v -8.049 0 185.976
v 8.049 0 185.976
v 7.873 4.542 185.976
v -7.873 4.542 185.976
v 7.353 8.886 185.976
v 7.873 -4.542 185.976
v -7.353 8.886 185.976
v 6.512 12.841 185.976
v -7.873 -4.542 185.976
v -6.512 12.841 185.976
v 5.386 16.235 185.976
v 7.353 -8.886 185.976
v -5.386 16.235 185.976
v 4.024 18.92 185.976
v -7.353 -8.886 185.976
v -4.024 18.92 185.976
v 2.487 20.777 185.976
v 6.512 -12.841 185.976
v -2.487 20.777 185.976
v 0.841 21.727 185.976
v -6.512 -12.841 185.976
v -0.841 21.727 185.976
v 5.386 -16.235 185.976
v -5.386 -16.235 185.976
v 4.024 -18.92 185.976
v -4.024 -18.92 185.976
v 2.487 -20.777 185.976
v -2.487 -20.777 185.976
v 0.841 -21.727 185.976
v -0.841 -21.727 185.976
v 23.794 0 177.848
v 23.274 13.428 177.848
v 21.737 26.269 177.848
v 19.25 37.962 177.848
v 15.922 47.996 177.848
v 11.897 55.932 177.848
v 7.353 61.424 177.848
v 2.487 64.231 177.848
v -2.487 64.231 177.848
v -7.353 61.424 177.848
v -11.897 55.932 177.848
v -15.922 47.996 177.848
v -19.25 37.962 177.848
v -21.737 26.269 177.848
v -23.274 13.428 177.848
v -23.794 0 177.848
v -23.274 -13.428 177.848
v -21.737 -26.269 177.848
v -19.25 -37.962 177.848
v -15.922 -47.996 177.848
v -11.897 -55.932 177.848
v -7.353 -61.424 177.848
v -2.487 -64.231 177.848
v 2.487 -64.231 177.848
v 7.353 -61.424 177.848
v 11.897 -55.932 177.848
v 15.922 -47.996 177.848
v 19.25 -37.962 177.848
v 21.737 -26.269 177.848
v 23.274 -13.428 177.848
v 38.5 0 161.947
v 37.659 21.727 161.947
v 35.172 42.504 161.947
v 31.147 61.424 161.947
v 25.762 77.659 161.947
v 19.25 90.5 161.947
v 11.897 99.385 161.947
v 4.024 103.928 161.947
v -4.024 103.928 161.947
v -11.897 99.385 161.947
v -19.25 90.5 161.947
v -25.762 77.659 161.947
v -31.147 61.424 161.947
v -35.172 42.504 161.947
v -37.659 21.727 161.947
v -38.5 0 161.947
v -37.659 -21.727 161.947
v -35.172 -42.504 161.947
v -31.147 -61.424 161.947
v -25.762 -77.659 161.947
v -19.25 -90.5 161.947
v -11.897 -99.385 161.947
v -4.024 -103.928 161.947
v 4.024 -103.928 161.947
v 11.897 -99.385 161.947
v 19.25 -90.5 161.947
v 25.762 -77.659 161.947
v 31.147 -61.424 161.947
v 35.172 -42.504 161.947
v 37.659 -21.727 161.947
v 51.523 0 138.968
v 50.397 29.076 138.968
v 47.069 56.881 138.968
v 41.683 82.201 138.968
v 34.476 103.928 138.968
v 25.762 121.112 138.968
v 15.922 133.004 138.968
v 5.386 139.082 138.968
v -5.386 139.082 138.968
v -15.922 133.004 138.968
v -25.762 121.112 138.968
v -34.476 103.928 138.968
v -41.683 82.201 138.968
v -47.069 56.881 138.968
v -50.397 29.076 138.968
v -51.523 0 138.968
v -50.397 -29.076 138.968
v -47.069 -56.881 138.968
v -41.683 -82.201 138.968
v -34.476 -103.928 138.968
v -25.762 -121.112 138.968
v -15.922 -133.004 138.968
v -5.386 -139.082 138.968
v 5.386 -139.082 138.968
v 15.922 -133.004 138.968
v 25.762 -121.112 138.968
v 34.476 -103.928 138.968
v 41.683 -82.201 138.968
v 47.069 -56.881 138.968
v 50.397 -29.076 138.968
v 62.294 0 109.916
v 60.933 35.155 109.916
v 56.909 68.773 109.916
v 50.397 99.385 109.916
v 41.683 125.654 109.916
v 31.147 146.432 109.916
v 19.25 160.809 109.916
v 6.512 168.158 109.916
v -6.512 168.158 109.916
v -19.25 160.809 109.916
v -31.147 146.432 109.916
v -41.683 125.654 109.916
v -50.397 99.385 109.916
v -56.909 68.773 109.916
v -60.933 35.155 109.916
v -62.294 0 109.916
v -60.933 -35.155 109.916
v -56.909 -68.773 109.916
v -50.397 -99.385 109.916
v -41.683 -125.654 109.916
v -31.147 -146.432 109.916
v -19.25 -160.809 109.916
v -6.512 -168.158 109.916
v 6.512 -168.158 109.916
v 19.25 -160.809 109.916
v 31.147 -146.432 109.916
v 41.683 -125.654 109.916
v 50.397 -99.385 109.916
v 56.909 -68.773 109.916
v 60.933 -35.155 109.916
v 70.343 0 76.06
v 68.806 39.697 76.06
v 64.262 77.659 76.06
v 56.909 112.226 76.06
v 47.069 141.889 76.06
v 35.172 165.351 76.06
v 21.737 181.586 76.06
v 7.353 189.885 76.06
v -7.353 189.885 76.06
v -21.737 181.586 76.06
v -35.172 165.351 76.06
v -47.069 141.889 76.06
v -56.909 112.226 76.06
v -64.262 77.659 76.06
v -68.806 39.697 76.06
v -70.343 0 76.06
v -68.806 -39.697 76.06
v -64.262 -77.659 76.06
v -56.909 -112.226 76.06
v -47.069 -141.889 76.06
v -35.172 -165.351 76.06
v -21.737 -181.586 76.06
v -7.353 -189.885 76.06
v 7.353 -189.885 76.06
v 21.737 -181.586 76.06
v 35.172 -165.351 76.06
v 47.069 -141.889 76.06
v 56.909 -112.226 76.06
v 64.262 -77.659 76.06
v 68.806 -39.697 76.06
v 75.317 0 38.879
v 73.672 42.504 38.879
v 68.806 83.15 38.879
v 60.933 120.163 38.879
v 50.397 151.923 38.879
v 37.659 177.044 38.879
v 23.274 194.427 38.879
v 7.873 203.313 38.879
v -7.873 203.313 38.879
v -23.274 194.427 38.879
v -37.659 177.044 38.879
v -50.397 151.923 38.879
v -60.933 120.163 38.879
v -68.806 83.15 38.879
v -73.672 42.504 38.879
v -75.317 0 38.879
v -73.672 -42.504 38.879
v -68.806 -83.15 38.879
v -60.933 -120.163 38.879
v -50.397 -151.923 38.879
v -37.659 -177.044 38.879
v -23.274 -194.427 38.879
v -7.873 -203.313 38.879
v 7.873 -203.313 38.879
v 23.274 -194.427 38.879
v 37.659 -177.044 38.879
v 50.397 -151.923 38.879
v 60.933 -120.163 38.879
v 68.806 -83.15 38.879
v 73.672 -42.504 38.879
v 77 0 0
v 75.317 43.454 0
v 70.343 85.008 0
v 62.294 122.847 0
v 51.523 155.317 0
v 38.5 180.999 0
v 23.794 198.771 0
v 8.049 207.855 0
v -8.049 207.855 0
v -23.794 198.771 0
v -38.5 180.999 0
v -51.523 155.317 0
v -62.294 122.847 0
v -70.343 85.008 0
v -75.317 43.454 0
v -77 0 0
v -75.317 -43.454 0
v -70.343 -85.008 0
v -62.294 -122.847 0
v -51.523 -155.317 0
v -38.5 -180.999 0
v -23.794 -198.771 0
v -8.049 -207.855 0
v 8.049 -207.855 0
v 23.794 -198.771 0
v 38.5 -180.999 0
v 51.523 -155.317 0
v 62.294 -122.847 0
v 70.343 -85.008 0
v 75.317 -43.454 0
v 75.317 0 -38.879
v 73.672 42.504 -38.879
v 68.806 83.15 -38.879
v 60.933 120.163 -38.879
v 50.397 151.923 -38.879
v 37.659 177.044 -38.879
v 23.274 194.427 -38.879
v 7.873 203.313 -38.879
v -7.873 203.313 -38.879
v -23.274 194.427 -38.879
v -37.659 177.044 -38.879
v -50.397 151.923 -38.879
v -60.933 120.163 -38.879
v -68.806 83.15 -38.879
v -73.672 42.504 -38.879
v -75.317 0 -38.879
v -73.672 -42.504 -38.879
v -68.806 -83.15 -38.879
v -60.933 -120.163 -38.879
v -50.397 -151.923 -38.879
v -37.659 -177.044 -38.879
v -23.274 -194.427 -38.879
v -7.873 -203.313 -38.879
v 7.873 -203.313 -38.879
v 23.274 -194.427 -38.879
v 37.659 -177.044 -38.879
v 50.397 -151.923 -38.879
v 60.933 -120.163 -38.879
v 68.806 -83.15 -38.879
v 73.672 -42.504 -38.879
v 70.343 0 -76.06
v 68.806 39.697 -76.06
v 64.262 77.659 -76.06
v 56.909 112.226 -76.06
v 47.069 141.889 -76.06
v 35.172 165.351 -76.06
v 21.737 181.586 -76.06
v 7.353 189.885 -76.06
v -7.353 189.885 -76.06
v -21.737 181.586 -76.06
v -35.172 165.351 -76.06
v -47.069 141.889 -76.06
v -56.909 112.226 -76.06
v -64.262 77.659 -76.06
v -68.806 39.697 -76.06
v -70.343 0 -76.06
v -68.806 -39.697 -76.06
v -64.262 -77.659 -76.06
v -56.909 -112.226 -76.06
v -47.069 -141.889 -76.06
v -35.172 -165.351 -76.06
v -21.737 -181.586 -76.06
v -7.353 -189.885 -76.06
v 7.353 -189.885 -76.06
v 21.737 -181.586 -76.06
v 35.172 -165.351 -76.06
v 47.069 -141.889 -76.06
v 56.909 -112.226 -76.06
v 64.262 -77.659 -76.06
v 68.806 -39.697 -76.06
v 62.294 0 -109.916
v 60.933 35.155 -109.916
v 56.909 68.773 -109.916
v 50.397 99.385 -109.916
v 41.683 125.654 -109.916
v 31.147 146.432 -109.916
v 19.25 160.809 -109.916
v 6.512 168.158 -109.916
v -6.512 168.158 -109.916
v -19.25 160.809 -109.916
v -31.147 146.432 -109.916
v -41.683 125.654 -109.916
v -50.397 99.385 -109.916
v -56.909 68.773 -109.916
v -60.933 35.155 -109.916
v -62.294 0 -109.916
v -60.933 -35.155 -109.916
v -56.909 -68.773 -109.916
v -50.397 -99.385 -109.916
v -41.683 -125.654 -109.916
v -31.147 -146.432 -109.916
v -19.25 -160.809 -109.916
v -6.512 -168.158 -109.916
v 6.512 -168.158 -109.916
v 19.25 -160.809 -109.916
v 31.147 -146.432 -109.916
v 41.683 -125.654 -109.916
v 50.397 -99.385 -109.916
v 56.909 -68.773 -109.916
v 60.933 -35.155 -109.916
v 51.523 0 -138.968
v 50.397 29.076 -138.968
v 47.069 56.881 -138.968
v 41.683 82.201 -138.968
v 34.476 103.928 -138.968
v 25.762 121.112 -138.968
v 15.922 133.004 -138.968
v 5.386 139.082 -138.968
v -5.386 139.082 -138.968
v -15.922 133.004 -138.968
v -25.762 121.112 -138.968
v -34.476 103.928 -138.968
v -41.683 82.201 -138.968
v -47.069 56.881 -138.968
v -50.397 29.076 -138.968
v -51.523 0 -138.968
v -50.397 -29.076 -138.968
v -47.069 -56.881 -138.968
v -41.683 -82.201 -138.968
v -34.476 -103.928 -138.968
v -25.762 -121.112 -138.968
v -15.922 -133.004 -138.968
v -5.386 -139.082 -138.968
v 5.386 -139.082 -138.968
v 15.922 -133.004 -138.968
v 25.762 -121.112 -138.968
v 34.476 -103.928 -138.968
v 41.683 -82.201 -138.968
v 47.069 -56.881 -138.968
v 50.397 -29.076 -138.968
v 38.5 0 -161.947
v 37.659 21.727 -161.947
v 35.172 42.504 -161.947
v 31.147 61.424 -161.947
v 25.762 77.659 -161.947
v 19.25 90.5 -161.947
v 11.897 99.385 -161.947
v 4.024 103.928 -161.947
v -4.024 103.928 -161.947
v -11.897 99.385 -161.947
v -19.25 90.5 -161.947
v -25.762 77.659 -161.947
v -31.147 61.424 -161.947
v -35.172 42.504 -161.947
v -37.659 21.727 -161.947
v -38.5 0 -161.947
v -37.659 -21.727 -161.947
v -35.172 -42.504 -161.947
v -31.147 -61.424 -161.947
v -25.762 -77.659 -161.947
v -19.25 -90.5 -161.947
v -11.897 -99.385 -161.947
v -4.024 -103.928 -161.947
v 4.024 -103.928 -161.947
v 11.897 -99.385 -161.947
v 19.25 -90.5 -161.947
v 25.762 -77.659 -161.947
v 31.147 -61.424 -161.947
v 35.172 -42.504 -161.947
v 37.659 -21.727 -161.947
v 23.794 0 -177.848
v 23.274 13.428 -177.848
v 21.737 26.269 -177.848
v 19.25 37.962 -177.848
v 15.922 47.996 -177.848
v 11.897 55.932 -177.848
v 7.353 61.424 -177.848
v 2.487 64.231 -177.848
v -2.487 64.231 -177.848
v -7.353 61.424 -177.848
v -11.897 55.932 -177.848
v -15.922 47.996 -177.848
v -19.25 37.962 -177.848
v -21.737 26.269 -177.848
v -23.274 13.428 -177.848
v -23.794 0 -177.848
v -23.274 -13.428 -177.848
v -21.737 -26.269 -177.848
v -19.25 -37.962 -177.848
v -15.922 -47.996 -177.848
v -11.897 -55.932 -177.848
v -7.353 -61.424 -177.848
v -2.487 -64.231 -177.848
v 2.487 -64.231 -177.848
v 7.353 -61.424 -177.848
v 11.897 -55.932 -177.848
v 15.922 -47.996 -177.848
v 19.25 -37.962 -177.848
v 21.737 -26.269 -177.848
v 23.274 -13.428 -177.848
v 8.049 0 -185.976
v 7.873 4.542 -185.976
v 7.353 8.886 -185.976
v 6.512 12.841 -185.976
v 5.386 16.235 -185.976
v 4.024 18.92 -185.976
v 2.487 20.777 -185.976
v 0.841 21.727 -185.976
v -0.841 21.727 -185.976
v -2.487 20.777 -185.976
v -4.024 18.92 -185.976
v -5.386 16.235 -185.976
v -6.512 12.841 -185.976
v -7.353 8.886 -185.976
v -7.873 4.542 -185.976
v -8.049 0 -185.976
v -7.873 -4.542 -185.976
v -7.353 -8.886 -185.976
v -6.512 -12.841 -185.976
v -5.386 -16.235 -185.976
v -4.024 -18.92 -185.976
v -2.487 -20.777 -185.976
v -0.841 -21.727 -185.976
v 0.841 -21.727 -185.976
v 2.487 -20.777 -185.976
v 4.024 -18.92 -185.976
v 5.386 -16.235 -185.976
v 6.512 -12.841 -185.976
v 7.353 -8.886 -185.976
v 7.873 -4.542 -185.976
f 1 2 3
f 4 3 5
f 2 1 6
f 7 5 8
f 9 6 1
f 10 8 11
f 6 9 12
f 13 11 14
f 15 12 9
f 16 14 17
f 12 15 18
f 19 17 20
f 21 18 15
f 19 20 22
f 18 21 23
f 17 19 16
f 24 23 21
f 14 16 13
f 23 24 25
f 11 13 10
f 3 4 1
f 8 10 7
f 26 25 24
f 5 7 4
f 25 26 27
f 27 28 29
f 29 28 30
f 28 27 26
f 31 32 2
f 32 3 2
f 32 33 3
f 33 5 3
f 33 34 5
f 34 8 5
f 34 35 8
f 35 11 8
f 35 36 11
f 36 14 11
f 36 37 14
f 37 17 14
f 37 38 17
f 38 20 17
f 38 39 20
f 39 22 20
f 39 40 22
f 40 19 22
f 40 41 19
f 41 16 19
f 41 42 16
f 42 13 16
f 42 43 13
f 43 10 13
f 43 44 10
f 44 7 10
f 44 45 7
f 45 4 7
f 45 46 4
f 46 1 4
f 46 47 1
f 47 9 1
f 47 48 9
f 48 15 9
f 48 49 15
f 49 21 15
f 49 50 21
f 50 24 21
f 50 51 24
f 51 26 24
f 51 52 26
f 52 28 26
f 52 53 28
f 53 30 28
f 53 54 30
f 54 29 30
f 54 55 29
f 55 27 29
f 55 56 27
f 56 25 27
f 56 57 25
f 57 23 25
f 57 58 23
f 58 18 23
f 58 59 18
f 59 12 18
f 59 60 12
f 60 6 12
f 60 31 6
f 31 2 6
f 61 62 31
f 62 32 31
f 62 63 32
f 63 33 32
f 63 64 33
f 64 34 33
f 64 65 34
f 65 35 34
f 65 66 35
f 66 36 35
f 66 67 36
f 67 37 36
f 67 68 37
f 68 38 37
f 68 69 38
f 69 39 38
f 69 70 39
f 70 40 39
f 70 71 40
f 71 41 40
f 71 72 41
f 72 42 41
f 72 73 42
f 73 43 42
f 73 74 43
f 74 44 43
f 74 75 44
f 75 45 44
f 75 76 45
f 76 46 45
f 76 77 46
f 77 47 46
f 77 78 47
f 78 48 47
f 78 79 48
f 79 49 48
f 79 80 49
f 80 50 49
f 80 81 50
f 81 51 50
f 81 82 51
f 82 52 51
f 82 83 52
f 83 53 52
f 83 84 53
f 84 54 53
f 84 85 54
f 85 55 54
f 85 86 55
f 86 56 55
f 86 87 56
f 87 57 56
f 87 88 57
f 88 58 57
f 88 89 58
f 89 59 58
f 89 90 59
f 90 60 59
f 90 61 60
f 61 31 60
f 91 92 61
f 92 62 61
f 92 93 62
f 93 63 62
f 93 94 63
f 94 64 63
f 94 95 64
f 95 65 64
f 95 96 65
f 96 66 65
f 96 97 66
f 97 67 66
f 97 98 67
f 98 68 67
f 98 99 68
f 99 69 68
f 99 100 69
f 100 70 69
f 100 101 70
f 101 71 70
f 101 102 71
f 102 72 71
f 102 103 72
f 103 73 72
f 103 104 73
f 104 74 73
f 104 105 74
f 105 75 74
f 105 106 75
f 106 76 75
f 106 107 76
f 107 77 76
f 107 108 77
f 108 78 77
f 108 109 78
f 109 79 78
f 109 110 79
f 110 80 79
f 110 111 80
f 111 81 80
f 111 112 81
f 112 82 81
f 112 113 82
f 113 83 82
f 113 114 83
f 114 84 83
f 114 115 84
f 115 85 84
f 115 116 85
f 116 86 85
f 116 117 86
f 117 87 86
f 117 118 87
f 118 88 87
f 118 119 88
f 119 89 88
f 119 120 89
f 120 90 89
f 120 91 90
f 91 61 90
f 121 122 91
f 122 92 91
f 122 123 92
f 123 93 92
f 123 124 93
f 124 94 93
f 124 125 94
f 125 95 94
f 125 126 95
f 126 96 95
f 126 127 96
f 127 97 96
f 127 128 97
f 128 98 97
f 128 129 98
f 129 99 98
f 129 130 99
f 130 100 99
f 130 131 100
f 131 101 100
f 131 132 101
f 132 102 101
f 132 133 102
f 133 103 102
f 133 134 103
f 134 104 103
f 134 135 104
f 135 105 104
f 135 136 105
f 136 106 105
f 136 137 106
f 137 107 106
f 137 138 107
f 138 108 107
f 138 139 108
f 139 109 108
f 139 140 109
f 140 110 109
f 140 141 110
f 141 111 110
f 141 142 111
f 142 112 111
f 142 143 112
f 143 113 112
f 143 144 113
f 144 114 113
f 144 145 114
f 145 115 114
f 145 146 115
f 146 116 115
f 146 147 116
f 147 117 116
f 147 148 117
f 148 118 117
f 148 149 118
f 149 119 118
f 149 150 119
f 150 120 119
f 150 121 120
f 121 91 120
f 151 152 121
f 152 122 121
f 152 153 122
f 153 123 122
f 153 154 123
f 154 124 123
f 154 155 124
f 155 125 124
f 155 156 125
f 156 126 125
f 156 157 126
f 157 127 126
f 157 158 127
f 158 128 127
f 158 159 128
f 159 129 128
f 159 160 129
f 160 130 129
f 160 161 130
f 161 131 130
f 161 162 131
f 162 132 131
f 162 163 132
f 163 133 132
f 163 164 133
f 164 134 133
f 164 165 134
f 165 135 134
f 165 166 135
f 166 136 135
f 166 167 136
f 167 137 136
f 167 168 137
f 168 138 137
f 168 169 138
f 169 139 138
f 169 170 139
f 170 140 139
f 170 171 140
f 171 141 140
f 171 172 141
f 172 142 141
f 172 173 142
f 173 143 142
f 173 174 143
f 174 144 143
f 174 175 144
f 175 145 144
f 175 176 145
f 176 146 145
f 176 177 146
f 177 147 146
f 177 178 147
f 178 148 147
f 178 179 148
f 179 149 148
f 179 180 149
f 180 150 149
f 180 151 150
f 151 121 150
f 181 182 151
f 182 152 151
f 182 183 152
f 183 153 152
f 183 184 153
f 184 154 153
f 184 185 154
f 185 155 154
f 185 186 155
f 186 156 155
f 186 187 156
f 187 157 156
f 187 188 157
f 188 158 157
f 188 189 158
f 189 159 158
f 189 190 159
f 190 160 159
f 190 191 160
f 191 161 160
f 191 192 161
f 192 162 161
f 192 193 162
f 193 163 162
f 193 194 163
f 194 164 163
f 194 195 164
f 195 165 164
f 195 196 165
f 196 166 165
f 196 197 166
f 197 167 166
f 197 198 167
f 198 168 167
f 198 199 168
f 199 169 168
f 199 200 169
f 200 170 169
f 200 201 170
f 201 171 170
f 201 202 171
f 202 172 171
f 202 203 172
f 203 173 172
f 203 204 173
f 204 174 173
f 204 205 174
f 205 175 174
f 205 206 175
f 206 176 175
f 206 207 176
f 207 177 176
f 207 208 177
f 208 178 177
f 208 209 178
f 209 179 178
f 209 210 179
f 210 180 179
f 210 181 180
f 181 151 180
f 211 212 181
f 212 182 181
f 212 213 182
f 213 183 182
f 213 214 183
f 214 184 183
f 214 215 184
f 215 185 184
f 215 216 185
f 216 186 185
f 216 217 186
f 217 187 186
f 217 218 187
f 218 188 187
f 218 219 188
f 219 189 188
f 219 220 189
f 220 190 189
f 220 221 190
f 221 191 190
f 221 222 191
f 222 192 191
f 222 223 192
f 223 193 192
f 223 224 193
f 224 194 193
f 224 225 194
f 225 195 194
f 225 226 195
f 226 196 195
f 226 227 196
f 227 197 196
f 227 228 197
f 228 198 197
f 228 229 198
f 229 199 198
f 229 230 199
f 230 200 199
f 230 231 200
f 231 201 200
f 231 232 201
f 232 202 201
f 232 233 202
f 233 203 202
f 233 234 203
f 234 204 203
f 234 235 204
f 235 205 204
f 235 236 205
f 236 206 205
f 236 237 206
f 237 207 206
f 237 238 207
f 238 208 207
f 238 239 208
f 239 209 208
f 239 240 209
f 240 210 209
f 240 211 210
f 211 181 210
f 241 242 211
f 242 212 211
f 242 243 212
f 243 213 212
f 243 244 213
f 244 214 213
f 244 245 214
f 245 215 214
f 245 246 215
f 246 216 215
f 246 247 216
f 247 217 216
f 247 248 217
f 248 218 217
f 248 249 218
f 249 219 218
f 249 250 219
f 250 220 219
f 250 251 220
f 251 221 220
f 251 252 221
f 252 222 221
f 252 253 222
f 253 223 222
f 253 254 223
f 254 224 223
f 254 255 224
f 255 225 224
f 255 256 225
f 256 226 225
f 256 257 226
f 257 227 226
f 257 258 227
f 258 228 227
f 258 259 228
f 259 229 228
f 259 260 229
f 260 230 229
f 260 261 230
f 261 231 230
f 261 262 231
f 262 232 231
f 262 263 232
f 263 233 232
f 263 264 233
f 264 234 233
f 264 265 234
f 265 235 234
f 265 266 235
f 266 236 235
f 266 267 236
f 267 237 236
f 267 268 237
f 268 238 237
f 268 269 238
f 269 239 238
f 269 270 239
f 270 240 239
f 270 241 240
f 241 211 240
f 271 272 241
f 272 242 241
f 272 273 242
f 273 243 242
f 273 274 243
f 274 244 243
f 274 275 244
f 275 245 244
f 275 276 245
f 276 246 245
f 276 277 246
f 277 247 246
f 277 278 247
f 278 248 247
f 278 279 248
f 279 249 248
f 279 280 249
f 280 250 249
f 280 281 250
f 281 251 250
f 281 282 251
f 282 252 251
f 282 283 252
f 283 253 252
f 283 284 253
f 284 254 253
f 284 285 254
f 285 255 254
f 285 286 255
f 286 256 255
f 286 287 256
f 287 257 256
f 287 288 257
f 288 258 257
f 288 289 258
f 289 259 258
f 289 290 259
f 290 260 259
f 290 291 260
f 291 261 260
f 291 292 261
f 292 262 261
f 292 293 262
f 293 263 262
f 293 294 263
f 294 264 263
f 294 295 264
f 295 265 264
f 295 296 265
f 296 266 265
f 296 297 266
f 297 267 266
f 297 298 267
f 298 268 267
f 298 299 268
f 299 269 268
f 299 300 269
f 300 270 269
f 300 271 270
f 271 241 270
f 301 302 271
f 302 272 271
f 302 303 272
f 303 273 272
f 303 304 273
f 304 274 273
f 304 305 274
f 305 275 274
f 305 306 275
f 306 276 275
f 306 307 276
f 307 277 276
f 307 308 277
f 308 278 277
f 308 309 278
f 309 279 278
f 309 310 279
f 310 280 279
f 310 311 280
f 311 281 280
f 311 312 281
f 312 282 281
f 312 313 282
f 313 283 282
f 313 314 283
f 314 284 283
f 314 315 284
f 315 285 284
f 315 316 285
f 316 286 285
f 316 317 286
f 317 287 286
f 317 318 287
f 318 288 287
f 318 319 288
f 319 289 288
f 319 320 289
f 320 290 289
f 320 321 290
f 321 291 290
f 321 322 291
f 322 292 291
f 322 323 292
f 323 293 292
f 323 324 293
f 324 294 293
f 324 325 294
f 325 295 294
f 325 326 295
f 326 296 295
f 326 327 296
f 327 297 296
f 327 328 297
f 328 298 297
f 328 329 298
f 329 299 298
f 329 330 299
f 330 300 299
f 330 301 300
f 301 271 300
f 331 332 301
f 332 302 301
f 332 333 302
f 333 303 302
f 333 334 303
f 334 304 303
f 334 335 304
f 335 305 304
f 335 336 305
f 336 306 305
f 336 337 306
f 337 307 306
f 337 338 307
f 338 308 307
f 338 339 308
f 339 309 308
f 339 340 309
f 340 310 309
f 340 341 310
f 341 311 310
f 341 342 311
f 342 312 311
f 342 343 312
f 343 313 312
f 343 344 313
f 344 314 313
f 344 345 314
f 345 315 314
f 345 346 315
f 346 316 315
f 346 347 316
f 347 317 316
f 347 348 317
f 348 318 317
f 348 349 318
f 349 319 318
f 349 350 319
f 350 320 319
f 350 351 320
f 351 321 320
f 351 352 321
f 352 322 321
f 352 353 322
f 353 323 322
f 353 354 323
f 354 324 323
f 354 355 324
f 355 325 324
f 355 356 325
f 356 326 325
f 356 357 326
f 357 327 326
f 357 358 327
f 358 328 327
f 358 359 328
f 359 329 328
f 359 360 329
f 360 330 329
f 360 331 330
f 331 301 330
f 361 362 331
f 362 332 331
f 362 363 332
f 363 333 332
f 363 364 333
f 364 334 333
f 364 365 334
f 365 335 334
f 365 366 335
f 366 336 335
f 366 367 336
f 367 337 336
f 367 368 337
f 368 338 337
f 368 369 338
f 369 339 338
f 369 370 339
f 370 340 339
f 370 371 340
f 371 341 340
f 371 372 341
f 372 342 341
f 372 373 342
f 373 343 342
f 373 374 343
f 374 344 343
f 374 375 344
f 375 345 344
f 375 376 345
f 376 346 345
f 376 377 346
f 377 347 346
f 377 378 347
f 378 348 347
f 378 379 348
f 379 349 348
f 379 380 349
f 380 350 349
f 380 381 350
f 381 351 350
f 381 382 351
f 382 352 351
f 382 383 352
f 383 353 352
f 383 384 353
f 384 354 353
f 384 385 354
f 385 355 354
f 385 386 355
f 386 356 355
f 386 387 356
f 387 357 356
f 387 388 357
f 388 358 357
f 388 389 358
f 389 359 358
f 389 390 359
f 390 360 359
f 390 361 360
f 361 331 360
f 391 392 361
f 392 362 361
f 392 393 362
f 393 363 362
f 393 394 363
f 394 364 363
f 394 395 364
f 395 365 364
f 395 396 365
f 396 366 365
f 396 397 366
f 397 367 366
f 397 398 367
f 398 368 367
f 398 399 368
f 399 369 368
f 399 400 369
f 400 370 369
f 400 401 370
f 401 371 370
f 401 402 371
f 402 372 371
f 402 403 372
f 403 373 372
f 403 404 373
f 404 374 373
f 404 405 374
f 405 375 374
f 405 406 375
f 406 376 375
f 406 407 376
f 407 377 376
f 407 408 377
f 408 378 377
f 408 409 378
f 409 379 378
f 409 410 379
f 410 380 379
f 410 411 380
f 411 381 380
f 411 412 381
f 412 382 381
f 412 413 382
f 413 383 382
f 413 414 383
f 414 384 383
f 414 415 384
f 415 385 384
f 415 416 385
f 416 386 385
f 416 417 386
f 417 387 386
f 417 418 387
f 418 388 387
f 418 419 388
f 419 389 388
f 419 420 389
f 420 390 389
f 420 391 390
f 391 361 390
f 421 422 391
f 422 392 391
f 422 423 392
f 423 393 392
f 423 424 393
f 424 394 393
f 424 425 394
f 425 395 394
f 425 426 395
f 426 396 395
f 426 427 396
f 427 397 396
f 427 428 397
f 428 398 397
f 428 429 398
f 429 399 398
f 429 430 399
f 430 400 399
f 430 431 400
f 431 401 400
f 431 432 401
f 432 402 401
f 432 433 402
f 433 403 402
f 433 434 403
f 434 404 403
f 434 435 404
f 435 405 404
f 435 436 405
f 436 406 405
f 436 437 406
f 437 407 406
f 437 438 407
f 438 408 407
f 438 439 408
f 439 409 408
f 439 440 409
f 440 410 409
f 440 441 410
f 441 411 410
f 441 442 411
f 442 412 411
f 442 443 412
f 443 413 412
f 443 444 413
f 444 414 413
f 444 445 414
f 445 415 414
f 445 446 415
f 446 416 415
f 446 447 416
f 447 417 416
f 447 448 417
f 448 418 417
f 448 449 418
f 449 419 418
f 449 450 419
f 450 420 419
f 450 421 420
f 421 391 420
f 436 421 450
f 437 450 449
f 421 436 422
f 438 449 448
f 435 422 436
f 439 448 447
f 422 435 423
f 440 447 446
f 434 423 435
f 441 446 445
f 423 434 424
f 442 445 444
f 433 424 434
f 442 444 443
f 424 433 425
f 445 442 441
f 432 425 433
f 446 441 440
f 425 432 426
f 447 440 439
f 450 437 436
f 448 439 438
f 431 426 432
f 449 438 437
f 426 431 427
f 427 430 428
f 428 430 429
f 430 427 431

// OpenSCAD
// Generated by SolidPython 1.0.1 on 2020-07-29 00:46:48


scale(v = [7, 19, 17]) {
	sphere(r = 11);
}
/***********************************************
*********      SolidPython code:      **********
************************************************
 
# import packages: SolidPython
from solid import *
from solid.utils import *
from itertools import chain, combinations, permutations


class Resize:

    def __init__(self, scad_file):
        self.scad_file = scad_file
        #self.scad_file = import_scad(scad_file)
        # cone/cylinder param:
        self.r1 = 0
        self.r2 = 0
        self.h = 0
        # rectangular prism param:
        self.w = 0
        self.l = 0
        # ellipse param:
        self.r = 0

    # import OpenScad code (file name corresponds to shape)


    # classify shape + parameters
    def assign(self, param1, param2, param3):
        if self.scad_file == 'cone.scad':
            self.r1 = param1
            self.r2 = param2
            self.h = param3
        elif self.scad_file == 'cylinder.scad':
            self.r1 = param1
            self.r2 = param2
            self.h = param3
        elif self.scad_file == 'rectangularPrism.scad':
            self.h = param1
            self.l = param2
            self.w = param3
        else:
            self.r = param1
            self.h = param2

    # resize parameters
    def iterate(self):
        x = range(3, 20, 2)
        i = 1
        if self.scad_file == 'cone.scad':
            tempList = list(permutations(x, 2))
            for temp in tempList:
                param1 = temp[0]
                param2 = temp[1]
                filepath = 'produced_scad_files/' + 'cone' + str(param1) + '_' + str(param2) + '_' + '.scad'
                scad_render_to_file(cylinder(h=param1, r1=param2, r2=0), filepath)

        elif self.scad_file == 'cylinder.scad':
            tempList = list(permutations(x, 3))
            for temp in tempList:
                param1 = temp[0]
                param2 = temp[1]
                filepath = 'produced_scad_files/' + 'cylinder' + str(param1) + '_' + str(param2) + '_' + '.scad'
                scad_render_to_file(cylinder(h=param1, r1=param2, r2=param2), filepath)

        elif self.scad_file == 'rectangularPrism.scad':
            tempList = list(permutations(x, 3))
            for temp in tempList:
                param1 = temp[0]
                param2 = temp[1]
                param3 = temp[2]
                filepath = 'produced_scad_files/' + 'rectangularPrism' + str(param1) + '_' + str(param2) + '_' + str(
                    param3) + '.scad'
                scad_render_to_file(cube(size=(param1, param2, param3)), filepath)

        elif self.scad_file == 'ellipse.scad':
            tempList = list(permutations(x, 4))
            for temp in tempList:
                param1 = temp[0]
                param2 = temp[1]
                param3 = temp[2]
                param4 = temp[3]
                filepath = 'produced_scad_files/' + 'ellipse' + str(param1) + '_' + str(param2) + '_' + str(param3) + '_' + str(param4) + '.scad'
                scad_render_to_file(scale([param1, param2, param3])(sphere(r=param4)), filepath)

    def render_to_scadfile(self):
        scad_render_to_file(scad, 'example.scad') 
 
************************************************/
